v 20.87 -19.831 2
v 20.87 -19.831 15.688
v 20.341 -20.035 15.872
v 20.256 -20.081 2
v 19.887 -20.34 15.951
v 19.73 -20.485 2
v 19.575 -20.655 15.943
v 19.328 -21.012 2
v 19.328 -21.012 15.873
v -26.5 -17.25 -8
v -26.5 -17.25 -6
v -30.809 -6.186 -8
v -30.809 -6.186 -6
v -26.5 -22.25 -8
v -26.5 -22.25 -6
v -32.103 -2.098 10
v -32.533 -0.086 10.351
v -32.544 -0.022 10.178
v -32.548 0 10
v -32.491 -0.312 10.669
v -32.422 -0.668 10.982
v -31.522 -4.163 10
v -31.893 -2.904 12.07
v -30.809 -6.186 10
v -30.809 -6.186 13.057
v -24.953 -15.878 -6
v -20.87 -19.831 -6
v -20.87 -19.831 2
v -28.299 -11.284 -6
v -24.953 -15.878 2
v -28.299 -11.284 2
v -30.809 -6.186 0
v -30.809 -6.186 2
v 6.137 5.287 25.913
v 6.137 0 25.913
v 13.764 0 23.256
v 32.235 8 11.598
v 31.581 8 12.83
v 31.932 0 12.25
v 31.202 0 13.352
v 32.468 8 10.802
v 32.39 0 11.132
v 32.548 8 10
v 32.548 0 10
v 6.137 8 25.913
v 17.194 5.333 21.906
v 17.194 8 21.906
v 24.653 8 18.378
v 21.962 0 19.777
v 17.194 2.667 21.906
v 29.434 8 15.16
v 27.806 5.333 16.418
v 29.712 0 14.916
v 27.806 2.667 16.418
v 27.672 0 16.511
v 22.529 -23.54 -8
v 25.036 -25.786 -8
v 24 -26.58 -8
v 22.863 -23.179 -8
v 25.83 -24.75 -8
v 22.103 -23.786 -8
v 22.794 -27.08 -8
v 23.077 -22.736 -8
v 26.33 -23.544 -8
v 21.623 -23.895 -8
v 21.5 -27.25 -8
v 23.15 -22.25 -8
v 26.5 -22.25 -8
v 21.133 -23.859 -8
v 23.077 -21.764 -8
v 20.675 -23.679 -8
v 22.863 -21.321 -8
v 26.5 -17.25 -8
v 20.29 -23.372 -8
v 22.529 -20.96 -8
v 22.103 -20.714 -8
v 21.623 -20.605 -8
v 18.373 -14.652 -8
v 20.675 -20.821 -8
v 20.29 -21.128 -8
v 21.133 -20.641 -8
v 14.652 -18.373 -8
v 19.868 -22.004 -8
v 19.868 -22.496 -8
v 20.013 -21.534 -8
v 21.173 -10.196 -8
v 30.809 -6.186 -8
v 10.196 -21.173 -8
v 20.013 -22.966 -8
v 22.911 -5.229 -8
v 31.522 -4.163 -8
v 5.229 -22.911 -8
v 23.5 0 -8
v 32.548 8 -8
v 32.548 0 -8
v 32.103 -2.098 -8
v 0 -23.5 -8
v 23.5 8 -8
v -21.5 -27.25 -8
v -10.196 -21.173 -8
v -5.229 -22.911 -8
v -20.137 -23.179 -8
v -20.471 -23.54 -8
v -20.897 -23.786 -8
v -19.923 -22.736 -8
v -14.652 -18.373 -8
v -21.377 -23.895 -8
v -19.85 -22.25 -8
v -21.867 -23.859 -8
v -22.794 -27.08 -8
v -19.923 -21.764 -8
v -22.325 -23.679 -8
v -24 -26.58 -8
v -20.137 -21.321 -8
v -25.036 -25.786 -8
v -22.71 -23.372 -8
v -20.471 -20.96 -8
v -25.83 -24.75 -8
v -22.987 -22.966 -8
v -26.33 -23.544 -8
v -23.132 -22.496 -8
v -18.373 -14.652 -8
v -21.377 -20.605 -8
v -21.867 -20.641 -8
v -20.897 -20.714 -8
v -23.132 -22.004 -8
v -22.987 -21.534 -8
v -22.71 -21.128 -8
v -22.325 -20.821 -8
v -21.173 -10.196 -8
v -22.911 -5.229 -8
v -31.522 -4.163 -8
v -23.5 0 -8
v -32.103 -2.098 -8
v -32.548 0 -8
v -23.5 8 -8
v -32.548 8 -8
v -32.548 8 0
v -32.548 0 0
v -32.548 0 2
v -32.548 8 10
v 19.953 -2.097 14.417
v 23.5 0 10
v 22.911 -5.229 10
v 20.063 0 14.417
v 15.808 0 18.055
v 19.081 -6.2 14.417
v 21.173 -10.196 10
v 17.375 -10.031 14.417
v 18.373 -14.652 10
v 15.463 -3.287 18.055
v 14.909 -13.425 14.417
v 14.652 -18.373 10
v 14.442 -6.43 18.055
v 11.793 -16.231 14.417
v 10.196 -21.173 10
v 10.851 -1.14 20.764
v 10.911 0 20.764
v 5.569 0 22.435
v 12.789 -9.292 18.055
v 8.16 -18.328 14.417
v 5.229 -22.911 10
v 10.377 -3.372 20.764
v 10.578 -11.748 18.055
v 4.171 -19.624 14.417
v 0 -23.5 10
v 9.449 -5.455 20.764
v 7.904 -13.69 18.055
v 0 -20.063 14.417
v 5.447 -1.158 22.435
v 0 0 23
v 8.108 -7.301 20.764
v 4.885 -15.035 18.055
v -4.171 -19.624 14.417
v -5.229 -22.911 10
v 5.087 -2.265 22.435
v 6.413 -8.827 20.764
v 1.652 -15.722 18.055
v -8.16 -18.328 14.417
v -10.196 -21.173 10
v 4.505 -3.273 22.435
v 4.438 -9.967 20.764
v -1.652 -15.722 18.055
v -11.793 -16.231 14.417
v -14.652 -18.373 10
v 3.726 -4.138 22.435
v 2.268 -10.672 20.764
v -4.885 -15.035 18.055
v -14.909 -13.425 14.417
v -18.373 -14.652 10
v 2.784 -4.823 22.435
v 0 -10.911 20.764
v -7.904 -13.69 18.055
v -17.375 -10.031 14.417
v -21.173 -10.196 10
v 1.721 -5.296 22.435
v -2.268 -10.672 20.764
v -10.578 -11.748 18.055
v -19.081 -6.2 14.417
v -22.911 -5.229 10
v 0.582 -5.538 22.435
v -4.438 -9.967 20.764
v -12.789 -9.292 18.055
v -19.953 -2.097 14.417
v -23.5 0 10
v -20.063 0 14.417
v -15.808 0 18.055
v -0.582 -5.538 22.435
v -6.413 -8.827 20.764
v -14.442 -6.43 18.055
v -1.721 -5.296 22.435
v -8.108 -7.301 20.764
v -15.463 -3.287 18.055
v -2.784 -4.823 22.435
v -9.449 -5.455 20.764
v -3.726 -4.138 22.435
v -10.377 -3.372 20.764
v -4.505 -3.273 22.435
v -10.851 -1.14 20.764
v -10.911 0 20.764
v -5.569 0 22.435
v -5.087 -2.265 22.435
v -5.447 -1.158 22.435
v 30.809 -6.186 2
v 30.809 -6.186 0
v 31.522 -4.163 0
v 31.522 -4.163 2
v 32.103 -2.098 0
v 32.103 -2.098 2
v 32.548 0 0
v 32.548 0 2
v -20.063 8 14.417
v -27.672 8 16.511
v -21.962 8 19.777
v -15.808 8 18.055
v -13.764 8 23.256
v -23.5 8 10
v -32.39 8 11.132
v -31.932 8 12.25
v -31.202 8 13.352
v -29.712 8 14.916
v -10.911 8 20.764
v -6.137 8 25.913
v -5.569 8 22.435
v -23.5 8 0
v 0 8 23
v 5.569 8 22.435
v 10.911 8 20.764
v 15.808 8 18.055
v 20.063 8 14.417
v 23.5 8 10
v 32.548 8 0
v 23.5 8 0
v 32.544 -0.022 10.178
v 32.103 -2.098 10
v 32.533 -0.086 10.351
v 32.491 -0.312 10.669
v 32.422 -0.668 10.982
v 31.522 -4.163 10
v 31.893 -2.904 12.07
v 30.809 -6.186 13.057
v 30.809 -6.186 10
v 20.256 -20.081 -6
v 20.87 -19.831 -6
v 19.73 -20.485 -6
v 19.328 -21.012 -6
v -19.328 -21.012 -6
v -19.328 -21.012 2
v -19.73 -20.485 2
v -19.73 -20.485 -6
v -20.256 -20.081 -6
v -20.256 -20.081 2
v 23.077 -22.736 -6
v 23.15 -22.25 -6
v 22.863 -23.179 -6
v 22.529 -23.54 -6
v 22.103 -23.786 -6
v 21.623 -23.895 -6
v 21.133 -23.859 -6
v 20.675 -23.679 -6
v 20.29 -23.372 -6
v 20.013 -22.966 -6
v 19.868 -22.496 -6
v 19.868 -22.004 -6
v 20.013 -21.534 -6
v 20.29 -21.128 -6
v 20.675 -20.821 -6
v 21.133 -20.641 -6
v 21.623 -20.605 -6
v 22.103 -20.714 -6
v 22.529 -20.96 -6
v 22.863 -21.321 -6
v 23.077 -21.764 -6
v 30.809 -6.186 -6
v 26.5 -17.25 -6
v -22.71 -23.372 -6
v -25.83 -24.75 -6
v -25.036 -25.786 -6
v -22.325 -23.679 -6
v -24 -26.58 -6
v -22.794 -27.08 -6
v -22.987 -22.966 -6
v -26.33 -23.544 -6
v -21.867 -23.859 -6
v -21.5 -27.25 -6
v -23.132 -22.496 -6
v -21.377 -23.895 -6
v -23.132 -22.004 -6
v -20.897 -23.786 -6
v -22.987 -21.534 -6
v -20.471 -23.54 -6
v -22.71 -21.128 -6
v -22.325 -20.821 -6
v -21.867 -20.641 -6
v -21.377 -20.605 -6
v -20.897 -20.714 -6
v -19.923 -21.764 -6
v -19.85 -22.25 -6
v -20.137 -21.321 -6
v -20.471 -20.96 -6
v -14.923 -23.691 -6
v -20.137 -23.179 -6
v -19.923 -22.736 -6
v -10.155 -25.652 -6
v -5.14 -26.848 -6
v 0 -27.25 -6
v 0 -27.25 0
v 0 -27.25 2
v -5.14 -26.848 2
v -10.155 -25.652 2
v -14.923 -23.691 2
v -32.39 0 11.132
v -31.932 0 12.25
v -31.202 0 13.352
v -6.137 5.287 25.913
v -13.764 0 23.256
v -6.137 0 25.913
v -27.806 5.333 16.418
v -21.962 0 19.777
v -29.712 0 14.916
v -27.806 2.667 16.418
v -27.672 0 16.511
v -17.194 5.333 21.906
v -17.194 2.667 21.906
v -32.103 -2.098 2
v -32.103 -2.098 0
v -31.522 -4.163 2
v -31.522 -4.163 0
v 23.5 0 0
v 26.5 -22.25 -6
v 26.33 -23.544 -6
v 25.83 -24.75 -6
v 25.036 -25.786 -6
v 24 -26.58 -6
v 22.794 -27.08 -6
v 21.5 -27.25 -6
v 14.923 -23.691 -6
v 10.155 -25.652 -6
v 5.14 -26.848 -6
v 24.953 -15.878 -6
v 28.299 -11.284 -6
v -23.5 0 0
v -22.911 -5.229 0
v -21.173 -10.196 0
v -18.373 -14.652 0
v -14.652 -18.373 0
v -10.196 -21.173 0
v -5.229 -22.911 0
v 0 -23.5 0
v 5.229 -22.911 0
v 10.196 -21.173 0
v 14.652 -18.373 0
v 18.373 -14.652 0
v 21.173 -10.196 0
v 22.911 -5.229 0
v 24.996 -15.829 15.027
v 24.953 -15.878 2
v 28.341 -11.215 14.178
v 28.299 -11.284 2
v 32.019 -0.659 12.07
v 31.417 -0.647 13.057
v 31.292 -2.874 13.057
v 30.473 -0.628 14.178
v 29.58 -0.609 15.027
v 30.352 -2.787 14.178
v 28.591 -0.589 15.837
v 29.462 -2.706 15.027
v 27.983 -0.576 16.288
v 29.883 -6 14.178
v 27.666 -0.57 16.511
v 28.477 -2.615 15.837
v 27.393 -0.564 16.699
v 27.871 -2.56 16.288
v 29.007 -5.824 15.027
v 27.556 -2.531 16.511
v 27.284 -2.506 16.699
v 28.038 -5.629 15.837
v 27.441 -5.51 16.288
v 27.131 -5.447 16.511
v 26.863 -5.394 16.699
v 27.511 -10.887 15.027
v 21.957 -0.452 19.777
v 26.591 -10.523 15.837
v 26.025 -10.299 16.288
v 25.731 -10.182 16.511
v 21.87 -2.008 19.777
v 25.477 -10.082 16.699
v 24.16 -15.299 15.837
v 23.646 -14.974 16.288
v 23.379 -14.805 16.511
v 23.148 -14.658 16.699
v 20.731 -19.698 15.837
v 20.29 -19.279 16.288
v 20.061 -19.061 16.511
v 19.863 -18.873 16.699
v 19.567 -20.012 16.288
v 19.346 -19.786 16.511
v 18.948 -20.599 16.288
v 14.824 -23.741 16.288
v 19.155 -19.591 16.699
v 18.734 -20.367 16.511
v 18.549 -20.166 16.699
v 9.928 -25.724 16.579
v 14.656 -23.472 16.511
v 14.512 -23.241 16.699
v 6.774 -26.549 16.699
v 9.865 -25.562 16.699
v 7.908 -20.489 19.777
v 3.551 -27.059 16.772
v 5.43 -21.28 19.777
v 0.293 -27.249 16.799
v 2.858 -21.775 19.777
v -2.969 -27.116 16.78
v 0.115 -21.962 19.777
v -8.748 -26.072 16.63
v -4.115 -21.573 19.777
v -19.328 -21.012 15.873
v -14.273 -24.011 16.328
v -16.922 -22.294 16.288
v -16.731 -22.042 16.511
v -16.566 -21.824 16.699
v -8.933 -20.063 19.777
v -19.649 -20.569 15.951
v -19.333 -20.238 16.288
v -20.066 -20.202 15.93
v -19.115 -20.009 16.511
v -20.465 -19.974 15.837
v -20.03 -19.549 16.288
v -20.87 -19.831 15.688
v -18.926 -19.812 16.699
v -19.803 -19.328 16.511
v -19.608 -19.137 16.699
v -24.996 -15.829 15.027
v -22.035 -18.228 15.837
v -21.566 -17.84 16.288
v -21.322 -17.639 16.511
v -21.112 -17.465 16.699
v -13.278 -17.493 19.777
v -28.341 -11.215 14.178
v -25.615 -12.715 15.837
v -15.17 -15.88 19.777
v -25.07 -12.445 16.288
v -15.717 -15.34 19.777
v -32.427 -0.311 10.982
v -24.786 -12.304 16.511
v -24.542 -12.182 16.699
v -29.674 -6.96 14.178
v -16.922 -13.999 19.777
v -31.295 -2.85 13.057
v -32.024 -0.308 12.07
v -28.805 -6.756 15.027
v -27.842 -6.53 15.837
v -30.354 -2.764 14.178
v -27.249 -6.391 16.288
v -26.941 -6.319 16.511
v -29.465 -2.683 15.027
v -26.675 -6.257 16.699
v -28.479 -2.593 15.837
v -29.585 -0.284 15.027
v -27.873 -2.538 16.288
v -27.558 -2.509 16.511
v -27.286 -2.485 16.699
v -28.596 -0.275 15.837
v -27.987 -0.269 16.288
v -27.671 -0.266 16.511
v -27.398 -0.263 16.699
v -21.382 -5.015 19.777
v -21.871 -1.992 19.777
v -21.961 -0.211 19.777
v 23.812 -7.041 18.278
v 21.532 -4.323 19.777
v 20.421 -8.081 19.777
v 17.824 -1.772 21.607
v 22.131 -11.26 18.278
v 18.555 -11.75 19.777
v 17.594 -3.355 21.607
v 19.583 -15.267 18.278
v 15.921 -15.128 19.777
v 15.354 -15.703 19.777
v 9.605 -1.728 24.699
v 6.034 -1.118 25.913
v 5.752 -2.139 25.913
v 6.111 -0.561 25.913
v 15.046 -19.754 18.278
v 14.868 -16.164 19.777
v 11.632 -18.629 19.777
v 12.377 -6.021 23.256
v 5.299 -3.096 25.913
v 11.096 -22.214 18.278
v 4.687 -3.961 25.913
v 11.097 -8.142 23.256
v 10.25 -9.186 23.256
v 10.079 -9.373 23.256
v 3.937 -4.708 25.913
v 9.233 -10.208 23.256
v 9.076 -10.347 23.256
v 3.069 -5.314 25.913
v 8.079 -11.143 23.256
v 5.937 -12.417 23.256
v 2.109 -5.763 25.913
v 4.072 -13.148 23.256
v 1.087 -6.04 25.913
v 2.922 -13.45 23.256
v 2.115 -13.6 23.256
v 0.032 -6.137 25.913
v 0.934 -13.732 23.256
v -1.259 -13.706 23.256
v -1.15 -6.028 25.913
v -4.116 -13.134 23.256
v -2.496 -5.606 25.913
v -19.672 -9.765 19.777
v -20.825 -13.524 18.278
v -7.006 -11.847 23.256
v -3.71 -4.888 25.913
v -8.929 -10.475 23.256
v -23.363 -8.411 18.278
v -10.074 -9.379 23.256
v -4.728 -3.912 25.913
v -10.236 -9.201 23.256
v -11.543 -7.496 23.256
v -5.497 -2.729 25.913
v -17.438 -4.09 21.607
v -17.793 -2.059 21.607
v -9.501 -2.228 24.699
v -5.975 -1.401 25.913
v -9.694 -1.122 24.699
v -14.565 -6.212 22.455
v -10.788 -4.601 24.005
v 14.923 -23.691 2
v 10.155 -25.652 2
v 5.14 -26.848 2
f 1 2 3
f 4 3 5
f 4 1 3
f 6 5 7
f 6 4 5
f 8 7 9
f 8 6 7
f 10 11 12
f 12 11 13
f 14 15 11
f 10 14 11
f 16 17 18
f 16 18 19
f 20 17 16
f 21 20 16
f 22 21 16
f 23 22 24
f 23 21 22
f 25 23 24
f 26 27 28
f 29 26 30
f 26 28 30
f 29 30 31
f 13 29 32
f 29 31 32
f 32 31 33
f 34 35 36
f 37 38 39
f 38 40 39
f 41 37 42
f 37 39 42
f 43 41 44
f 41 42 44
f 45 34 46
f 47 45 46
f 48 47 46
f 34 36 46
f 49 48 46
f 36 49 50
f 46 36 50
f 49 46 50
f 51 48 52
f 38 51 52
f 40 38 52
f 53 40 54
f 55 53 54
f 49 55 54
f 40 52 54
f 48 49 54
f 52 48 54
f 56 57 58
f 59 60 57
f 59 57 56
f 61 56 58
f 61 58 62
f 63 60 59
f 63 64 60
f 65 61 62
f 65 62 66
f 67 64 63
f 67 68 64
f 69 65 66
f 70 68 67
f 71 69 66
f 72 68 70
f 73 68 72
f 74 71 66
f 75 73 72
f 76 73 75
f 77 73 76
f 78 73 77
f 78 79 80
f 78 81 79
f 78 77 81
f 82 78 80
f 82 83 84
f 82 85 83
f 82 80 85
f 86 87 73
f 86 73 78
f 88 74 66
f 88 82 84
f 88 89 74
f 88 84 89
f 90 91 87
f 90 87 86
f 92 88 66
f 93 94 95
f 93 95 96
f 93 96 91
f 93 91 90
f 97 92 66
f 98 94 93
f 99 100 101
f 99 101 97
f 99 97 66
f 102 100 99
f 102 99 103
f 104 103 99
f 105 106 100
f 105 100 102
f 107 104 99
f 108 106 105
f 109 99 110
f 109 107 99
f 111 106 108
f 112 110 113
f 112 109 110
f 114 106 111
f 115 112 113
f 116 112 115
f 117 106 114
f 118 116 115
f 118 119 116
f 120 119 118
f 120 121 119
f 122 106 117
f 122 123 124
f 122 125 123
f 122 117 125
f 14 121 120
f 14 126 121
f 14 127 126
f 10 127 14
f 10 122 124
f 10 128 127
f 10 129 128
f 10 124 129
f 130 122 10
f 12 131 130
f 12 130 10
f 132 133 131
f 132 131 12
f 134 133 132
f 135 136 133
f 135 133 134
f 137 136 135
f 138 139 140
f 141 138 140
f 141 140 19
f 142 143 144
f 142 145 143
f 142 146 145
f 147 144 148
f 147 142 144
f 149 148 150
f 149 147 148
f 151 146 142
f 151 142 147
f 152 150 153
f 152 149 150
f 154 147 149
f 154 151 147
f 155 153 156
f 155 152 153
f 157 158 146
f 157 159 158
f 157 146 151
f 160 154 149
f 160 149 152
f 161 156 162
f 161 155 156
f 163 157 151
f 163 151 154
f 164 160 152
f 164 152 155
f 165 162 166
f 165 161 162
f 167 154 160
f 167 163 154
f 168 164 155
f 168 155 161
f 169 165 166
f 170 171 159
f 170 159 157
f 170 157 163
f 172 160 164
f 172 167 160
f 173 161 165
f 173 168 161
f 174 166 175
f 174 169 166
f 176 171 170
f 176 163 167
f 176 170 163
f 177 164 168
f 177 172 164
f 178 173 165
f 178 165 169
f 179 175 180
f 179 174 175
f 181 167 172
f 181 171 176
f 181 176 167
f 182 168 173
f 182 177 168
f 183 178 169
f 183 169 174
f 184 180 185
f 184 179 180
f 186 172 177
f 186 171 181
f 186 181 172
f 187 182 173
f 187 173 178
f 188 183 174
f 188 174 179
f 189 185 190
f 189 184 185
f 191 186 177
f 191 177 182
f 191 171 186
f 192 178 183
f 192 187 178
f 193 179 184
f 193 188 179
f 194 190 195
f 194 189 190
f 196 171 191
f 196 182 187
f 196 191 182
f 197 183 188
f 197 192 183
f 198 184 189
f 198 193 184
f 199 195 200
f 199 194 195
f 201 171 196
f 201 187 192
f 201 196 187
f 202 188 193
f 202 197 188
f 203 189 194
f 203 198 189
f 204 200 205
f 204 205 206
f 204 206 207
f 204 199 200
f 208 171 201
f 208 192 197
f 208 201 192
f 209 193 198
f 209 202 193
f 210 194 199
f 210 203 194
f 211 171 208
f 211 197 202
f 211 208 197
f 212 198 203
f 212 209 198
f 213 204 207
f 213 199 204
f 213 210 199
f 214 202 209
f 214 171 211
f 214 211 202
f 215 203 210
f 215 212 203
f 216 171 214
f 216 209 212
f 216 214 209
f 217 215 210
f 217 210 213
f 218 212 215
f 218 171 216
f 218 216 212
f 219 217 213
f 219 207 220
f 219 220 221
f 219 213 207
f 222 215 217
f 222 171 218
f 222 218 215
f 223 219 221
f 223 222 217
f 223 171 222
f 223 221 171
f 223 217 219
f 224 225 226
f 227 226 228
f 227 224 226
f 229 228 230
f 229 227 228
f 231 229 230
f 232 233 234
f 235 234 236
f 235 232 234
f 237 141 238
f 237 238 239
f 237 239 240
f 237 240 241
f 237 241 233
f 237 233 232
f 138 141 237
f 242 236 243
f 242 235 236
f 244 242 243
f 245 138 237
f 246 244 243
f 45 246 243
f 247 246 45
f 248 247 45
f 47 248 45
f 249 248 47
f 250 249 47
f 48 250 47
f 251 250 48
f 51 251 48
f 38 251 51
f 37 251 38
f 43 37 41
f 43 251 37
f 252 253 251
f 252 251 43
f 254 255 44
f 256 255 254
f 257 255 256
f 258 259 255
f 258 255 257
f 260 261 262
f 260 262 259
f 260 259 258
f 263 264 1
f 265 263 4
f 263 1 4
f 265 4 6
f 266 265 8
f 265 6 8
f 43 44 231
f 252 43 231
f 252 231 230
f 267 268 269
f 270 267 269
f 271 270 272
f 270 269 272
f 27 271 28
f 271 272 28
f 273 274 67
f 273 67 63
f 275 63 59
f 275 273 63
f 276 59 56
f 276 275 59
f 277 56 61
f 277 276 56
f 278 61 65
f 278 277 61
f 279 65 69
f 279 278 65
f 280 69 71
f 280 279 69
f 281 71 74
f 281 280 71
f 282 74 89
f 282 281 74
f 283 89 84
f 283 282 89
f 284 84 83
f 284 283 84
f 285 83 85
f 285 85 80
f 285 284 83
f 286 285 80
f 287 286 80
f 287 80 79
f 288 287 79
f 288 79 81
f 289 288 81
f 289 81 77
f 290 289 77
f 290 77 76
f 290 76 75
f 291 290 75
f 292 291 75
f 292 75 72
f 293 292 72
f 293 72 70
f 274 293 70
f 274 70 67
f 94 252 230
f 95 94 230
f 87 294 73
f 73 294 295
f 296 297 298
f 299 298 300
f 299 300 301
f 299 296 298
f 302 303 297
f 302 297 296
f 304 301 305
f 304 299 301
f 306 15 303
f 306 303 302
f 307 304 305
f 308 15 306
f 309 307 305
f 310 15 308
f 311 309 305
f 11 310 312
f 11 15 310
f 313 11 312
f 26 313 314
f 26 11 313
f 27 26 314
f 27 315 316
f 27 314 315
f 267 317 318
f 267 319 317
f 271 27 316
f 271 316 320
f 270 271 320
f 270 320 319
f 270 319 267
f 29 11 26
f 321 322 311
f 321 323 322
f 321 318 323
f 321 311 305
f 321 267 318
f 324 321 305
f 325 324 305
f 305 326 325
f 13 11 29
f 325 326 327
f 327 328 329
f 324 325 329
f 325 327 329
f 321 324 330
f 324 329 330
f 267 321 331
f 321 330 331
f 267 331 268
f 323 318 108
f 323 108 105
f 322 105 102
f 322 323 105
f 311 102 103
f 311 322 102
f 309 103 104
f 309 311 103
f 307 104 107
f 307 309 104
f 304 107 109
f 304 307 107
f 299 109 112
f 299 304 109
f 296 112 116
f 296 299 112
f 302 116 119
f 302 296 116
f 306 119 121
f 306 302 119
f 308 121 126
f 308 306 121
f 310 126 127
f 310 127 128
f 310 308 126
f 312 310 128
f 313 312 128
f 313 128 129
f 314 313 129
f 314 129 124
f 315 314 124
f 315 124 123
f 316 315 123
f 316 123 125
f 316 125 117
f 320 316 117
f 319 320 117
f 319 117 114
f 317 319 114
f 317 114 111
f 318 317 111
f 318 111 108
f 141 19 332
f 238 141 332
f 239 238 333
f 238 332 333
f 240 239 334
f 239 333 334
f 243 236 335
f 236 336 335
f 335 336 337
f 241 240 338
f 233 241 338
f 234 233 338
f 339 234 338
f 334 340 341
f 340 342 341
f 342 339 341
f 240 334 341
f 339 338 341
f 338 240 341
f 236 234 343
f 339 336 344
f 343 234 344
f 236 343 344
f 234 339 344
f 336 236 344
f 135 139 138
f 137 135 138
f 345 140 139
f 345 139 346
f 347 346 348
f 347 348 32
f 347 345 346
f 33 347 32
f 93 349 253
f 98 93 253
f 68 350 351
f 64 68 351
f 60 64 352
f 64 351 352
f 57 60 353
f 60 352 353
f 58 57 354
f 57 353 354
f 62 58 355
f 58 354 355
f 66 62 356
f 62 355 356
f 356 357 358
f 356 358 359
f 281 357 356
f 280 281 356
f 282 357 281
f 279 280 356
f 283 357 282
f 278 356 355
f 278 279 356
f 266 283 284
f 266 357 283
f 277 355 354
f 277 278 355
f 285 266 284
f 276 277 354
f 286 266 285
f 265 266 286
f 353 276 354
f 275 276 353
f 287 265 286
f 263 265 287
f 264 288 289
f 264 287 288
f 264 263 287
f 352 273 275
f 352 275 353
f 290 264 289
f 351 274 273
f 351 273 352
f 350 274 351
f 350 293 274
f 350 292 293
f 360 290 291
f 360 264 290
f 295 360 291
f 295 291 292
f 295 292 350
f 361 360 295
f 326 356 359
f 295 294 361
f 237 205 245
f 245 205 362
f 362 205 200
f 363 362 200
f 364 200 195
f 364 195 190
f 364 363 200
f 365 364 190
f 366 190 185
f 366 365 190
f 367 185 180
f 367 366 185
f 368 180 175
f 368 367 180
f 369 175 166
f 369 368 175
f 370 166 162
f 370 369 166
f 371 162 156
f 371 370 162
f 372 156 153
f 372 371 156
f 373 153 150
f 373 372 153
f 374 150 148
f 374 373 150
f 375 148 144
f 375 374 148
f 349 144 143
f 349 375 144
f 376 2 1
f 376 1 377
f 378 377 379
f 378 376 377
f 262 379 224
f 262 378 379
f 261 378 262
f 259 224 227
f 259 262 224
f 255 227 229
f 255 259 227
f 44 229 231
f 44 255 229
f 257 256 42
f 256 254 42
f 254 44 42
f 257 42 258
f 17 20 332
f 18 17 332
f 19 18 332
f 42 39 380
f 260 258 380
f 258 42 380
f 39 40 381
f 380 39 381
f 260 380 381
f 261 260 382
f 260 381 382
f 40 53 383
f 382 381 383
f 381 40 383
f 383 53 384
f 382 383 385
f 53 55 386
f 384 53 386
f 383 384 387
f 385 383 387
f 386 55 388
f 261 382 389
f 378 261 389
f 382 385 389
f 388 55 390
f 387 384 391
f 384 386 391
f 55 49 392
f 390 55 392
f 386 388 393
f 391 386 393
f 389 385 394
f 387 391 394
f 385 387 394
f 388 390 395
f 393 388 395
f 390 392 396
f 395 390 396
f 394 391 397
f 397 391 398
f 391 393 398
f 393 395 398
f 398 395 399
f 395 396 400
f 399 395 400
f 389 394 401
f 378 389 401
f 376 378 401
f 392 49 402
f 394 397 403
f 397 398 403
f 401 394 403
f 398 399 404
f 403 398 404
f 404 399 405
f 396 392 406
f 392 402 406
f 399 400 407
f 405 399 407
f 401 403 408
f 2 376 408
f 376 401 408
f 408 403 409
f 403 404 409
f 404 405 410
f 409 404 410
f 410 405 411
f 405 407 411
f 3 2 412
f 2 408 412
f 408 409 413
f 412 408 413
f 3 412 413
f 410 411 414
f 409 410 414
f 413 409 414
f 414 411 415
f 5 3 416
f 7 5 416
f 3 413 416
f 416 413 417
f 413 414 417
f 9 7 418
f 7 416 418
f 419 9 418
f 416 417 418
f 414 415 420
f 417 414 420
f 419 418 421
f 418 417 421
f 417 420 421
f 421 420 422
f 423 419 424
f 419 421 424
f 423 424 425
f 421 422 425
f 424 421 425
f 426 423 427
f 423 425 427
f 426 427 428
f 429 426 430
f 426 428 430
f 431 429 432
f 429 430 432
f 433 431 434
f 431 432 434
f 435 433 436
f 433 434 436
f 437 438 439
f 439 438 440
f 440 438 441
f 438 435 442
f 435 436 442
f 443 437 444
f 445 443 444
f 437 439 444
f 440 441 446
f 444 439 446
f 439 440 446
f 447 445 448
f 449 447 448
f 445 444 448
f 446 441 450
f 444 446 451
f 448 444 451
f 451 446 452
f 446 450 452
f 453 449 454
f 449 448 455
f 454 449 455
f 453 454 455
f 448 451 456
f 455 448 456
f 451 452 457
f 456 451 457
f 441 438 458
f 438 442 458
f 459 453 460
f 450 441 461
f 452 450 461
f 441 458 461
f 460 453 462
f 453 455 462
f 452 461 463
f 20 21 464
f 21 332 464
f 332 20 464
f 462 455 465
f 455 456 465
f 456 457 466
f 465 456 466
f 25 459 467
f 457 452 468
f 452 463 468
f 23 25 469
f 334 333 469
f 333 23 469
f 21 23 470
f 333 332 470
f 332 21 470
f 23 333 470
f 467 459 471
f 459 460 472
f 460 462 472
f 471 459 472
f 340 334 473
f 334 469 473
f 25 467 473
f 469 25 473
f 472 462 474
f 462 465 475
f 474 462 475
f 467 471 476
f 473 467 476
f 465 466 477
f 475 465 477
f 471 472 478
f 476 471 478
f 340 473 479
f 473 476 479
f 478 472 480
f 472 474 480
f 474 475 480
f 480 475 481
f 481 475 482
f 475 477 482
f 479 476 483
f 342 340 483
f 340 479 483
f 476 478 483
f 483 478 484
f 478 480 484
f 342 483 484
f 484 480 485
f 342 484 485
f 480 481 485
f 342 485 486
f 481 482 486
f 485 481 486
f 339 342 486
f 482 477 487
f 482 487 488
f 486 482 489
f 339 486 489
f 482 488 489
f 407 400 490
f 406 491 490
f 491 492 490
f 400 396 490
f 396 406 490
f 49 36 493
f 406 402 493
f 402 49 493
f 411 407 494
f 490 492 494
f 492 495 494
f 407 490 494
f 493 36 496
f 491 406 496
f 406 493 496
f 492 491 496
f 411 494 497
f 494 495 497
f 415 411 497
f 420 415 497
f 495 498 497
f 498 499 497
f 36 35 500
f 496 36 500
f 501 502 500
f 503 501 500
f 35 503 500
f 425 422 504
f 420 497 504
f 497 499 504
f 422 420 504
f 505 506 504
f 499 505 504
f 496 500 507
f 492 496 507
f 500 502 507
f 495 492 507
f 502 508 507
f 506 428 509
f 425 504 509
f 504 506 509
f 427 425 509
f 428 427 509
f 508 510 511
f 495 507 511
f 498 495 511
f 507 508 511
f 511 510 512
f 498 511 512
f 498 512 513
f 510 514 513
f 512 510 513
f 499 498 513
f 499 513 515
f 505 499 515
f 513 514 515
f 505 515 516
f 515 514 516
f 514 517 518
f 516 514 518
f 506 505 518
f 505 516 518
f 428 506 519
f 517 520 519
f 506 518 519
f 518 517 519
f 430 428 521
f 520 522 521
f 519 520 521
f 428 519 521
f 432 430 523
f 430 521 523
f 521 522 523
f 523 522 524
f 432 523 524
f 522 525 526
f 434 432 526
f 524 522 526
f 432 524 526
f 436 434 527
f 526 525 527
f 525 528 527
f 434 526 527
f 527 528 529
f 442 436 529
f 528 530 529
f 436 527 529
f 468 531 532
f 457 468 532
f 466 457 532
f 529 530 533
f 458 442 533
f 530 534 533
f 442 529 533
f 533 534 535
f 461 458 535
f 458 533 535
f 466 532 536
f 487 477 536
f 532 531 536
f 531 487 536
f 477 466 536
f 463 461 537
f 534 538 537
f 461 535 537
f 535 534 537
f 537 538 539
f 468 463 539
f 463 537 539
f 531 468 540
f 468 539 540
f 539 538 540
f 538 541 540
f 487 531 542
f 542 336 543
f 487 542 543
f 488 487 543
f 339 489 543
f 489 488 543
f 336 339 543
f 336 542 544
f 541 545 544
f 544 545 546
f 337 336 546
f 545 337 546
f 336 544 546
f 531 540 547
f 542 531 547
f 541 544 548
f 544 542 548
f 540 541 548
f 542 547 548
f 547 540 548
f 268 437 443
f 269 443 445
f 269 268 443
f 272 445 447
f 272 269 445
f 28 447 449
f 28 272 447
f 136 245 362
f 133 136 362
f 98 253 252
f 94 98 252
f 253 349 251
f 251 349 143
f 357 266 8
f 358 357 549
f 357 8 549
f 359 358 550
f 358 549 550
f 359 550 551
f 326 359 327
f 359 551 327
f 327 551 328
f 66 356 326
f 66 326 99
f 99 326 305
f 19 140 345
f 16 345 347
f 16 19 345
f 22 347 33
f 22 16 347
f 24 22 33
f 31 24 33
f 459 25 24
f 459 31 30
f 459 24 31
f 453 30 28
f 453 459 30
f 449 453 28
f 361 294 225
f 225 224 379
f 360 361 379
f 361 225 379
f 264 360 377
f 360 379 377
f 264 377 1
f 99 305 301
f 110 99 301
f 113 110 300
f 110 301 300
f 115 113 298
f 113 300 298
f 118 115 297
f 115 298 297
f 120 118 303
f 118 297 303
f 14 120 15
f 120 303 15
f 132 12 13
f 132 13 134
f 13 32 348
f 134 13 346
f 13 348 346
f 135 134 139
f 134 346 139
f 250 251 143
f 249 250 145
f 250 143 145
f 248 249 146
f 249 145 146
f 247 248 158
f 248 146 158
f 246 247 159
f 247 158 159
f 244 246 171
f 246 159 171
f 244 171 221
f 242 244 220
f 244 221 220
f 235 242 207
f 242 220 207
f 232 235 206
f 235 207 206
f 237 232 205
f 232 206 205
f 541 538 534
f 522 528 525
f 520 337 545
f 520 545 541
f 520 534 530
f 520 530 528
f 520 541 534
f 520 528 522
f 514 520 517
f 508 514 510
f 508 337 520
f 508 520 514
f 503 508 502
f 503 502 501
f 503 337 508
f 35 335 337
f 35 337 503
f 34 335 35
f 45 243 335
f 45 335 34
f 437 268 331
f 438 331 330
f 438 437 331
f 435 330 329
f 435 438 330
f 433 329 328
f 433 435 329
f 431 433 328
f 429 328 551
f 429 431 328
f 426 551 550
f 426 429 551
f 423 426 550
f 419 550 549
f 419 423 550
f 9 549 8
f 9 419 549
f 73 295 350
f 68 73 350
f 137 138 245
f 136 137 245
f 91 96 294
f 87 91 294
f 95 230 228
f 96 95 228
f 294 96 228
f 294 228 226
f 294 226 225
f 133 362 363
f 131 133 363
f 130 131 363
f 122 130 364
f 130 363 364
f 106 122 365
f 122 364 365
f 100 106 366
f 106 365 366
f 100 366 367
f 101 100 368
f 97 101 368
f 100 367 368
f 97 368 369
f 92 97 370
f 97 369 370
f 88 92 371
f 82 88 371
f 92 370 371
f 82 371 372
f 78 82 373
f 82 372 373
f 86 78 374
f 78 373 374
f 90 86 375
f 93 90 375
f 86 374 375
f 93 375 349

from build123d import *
from build123d.topology import SkipClean

# Parameters (mm, degrees)
EXTRUDE_1_DEPTH           = 2
FILLET_1_R                = 5
SKETCH_2_R                = 1.65
EXTRUDE_2_DEPTH           = 2
SKETCH_2_2_R              = 1.65
CUT_EXTRUDE_1_DEPTH       = 2
EXTRUDE_3_DEPTH           = 8
REVOLVE_4_ANGLE           = 180
CUT_EXTRUDE_3_DEPTH       = 8
CUT_EXTRUDE_3_DEPTH_BACK  = 50.836922569
CUT_EXTRUDE_4_DEPTH       = 47.549848859
CUT_EXTRUDE_4_DEPTH_BACK  = 47.549848859
EXTRUDE_4_DEPTH           = 8
CUT_EXTRUDE_15_DEPTH      = 2
CUT_EXTRUDE_15_DEPTH_BACK = 51.804237139
SKETCH_16_R               = 8.1
CUT_EXTRUDE_16_DEPTH      = 56.283591172
SKETCH_18_R               = 2.5
CUT_EXTRUDE_17_DEPTH      = 49.721344888
SKETCH_19_R               = 1.65
EXTRUDE_5_DEPTH           = 8
SKETCH_20_R               = 1.65
CUT_EXTRUDE_18_DEPTH      = 8


with BuildPart() as part:
    # 草图1 → 凸台-拉伸1 (new body)
    with BuildSketch(Plane.XY):
        with BuildLine():
            Line((-23.5, 0), (-26.5, 0))
            Line((-26.5, 0), (-26.5, -27.25))
            Line((-26.5, -27.25), (26.5, -27.25))
            Line((26.5, -27.25), (26.5, 0))
            Line((26.5, 0), (23.5, 0))
            ThreePointArc((23.5, 0), (0, -23.5), (-23.5, 0))
        make_face()
    extrude(amount=EXTRUDE_1_DEPTH)

    # 圆角1
    fillet_1_edges = [part.edges().sort_by_distance(p)[0] for p in [
        (-26.5, -27.25, 1),
        (26.5, -27.25, 1),
    ]]
    fillet(fillet_1_edges, radius=FILLET_1_R)

    # 草图2 → 凸台-拉伸2 (add)
    with BuildSketch(Plane.XY.offset(2)):
        with Locations((-21.5, -22.25)):
            Circle(SKETCH_2_R)
        with Locations((21.5, -22.25)):
            Circle(SKETCH_2_R)
        Polygon((33.218421053, 0), (26.5, -17.25), (26.5, 0), align=None)
        Polygon((-26.5, -17.25), (-33.218421053, 0), (-26.5, 0), align=None)
    extrude(amount=-EXTRUDE_2_DEPTH)

    # 草图2<2> → 切除-拉伸1 (cut)
    with BuildSketch(Plane.XY.offset(2)):
        with Locations((-21.5, -22.25)):
            Circle(SKETCH_2_2_R)
        with Locations((21.5, -22.25)):
            Circle(SKETCH_2_2_R)
    extrude(amount=-CUT_EXTRUDE_1_DEPTH, mode=Mode.SUBTRACT)

    # 草图5 → 凸台-拉伸3 (add)
    with BuildSketch(Plane.XY.offset(2)):
        with BuildLine():
            Line((23.5, 0), (32.54831672, 0))
            ThreePointArc((32.54831672, 0), (0, -27.25), (-32.54831672, 0))
            Line((-32.54831672, 0), (-23.5, 0))
            ThreePointArc((-23.5, 0), (0, -23.5), (23.5, 0))
        make_face()
    extrude(amount=EXTRUDE_3_DEPTH)

    # 草图8 → 旋转4 (revolve)
    with BuildSketch(Plane(origin=(0, 0, 0), x_dir=(1, 0, 0), z_dir=(0, 1, 0))):
        with BuildLine():
            add(Edge.make_bspline(
                [(32.54831672, -10), (32.54831672, -19.011252641), (1.892491424, -26.996963713), (0, -27.912632857)],
                knots=[0, 0, 0, 0, 0.940683104, 0.940683104, 0.940683104, 0.940683104], degree=3))
            Line((32.54831672, -10), (23.5, -10))
            ThreePointArc((23.5, -10), (13.428049002, -19.533396273), (0, -23))
            Line((0, -23), (0, -27.912632857))
        make_face()
    revolve(axis=Axis((0, 0, 28), (0, 0, -1)), revolution_arc=REVOLVE_4_ANGLE)

    # 草图11 → 切除-拉伸3 (cut, two sides: drawn at the far end of the back side and taken through both)
    with BuildSketch(Plane(origin=(0, 0, 10), x_dir=(-1, 0, 0), z_dir=(0, 0, -1)).offset(-CUT_EXTRUDE_3_DEPTH_BACK)):
        with BuildLine():
            Line((-30.809155169, -6.185952945), (-32.495321725, -1.856606381))
            ThreePointArc((-32.495321725, -1.856606381), (0, -32.54831672), (32.495321725, -1.856606381))
            Line((32.495321725, -1.856606381), (30.809155169, -6.185952945))
            ThreePointArc((30.809155169, -6.185952945), (0, -27.25), (-30.809155169, -6.185952945))
        make_face()
    extrude(amount=CUT_EXTRUDE_3_DEPTH + CUT_EXTRUDE_3_DEPTH_BACK, mode=Mode.SUBTRACT)

    # 草图11<3> → 切除-拉伸4 (cut, two sides: drawn at the far end of the back side and taken through both)
    with BuildSketch(Plane(origin=(0, 0, 10), x_dir=(-1, 0, 0), z_dir=(0, 0, -1)).offset(-CUT_EXTRUDE_4_DEPTH_BACK)):
        with BuildLine():
            Line((-32.54831672, 0), (-33.218421053, 0))
            Line((-33.218421053, 0), (-30.809155169, -6.185952945))
            ThreePointArc((-30.809155169, -6.185952945), (-31.829370312, -3.13532686), (-32.54831672, 0))
        make_face()
        with BuildLine():
            Line((33.218421053, 0), (32.54831672, 0))
            ThreePointArc((32.54831672, 0), (31.829370312, -3.13532686), (30.809155169, -6.185952945))
            Line((30.809155169, -6.185952945), (33.218421053, 0))
        make_face()
    extrude(amount=CUT_EXTRUDE_4_DEPTH + CUT_EXTRUDE_4_DEPTH_BACK, mode=Mode.SUBTRACT)

    # 草图13 → 凸台-拉伸4 (add)
    with BuildSketch(Plane(origin=(0, 0, 0), x_dir=(1, 0, 0), z_dir=(0, 1, 0))):
        with BuildLine():
            Line((-23.5, 0), (-32.54831672, 0))
            Line((-32.54831672, 0), (-32.54831672, -10))
            add(Edge.make_bspline(
                [(-32.54831672, -10), (-32.54831672, -19.011252636), (-1.892491463, -26.996963703), (-4e-09, -27.912632855)],
                knots=[0, 0, 0, 0, 0.940683104, 0.940683104, 0.940683104, 0.940683104], degree=3))
            add(Edge.make_bspline(
                [(-4e-09, -27.912632855), (1.892491463, -26.996963703), (32.54831672, -19.011252636), (32.54831672, -10)],
                knots=[0, 0, 0, 0, 0.940683104, 0.940683104, 0.940683104, 0.940683104], degree=3))
            Line((32.54831672, -10), (32.54831672, 0))
            Line((32.54831672, 0), (23.5, 0))
            Line((23.5, 0), (23.5, -10))
            ThreePointArc((23.5, -10), (0, -23), (-23.5, -10))
            Line((-23.5, -10), (-23.5, 0))
        make_face()
    extrude(amount=EXTRUDE_4_DEPTH)

    # 草图16 → 切除-拉伸15 (cut, two sides: drawn at the far end of the back side and taken through both)
    with BuildSketch(Plane(origin=(0, 0, 27.912632848), x_dir=(-1, 0, 0), z_dir=(0, 0, -1)).offset(-CUT_EXTRUDE_15_DEPTH_BACK)):
        Circle(SKETCH_16_R)
    extrude(amount=CUT_EXTRUDE_15_DEPTH + CUT_EXTRUDE_15_DEPTH_BACK, mode=Mode.SUBTRACT)

    # 草图17 → 切除-拉伸16 (cut, through all)
    with BuildSketch(Plane(origin=(0, 8, 0), x_dir=(1, 0, 0), z_dir=(0, 1, 0))):
        with BuildLine():
            Line((-6.136694484, -25.912632848), (-1.268857754, -25.912632848))
            Line((-1.268857754, -25.912632848), (-1.268857754, -27.464886901))
            add(Edge.make_bspline(
                [(-1.268857754, -27.464886901), (-2.37160723, -27.10853767), (-4.077764087, -26.58262095), (-6.136694484, -25.912632848)],
                knots=[0.699251463, 0.699251463, 0.699251463, 0.699251463, 0.851241237, 0.851241237, 0.851241237, 0.851241237], degree=3))
        make_face()
        with BuildLine():
            Line((1.268857754, -27.464886901), (1.268857754, -25.912632848))
            Line((1.268857754, -25.912632848), (6.136694484, -25.912632848))
            add(Edge.make_bspline(
                [(6.136694484, -25.912632848), (4.077764087, -26.58262095), (2.37160723, -27.10853767), (1.268857754, -27.464886901)],
                knots=[0.089441867, 0.089441867, 0.089441867, 0.089441867, 0.241431641, 0.241431641, 0.241431641, 0.241431641], degree=3))
        make_face()
    extrude(amount=-CUT_EXTRUDE_16_DEPTH, mode=Mode.SUBTRACT)

    # 草图18 → 切除-拉伸17 (cut, through all)
    with BuildSketch(Plane.XY.offset(2)):
        with Locations((-21.5, -22.25)):
            Circle(SKETCH_18_R)
        with Locations((21.5, -22.25)):
            Circle(SKETCH_18_R)
    extrude(amount=CUT_EXTRUDE_17_DEPTH, mode=Mode.SUBTRACT)

    # 草图19 → 凸台-拉伸5 (add)
    with SkipClean():  # the faces are left unmerged after this step: merging them gives an invalid solid
        with BuildSketch(Plane(origin=(0, 0, 0), x_dir=(-1, 0, 0), z_dir=(0, 0, -1))):
            with BuildLine():
                Line((26.5, -17.25), (30.809155169, -6.185952945))
                ThreePointArc((30.809155169, -6.185952945), (31.829370312, -3.13532686), (32.54831672, 0))
                Line((32.54831672, 0), (32.54831672, 8))
                Line((32.54831672, 8), (23.5, 8))
                Line((23.5, 8), (23.5, 0))
                ThreePointArc((23.5, 0), (0, -23.5), (-23.5, 0))
                Line((-23.5, 0), (-23.5, 8))
                Line((-23.5, 8), (-32.54831672, 8))
                Line((-32.54831672, 8), (-32.54831672, 0))
                ThreePointArc((-32.54831672, 0), (-31.829370312, -3.13532686), (-30.809155169, -6.185952945))
                Line((-30.809155169, -6.185952945), (-26.5, -17.25))
                Line((-26.5, -17.25), (-26.5, -22.25))
                ThreePointArc((-26.5, -22.25), (-25.035533906, -25.785533906), (-21.5, -27.25))
                Line((-21.5, -27.25), (21.5, -27.25))
                ThreePointArc((21.5, -27.25), (25.035533906, -25.785533906), (26.5, -22.25))
                Line((26.5, -22.25), (26.5, -17.25))
            make_face()
            with Locations((21.5, -22.25)):
                Circle(SKETCH_19_R, mode=Mode.SUBTRACT)
            with Locations((-21.5, -22.25)):
                Circle(SKETCH_19_R, mode=Mode.SUBTRACT)
        extrude(amount=EXTRUDE_5_DEPTH)

    # 草图20 → 切除-拉伸18 (cut)
    # profile 1 of 2: a face of its own
    with SkipClean():  # the faces are left unmerged after this step: merging them gives an invalid solid
        with BuildSketch(Plane.XY.offset(2)):
            with BuildLine():
                ThreePointArc((19.32782273, -21.012403172), (10.154707599, -25.651983205), (0, -27.25))
                Line((0, -27.25), (21.5, -27.25))
                ThreePointArc((21.5, -27.25), (25.035533906, -25.785533906), (26.5, -22.25))
                Line((26.5, -22.25), (26.5, -17.25))
                Line((26.5, -17.25), (30.809155169, -6.185952945))
                ThreePointArc((30.809155169, -6.185952945), (26.725252476, -13.653221694), (20.870444361, -19.830566244))
                ThreePointArc((20.870444361, -19.830566244), (19.979601548, -20.265462637), (19.32782273, -21.012403172))
            make_face()
        # profile 2 of 2: a face of its own
        with BuildSketch(Plane.XY.offset(2)):
            with BuildLine():
                Line((-21.5, -27.25), (0, -27.25))
                ThreePointArc((0, -27.25), (-10.154707599, -25.651983205), (-19.32782273, -21.012403172))
                ThreePointArc((-19.32782273, -21.012403172), (-19.979601548, -20.265462637), (-20.870444361, -19.830566244))
                ThreePointArc((-20.870444361, -19.830566244), (-26.725252476, -13.653221694), (-30.809155169, -6.185952945))
                Line((-30.809155169, -6.185952945), (-26.5, -17.25))
                Line((-26.5, -17.25), (-26.5, -22.25))
                ThreePointArc((-26.5, -22.25), (-25.035533906, -25.785533906), (-21.5, -27.25))
            make_face()
            with Locations((-21.5, -22.25)):
                Circle(SKETCH_20_R, mode=Mode.SUBTRACT)
        extrude(amount=-CUT_EXTRUDE_18_DEPTH, mode=Mode.SUBTRACT)


solid = part.part
